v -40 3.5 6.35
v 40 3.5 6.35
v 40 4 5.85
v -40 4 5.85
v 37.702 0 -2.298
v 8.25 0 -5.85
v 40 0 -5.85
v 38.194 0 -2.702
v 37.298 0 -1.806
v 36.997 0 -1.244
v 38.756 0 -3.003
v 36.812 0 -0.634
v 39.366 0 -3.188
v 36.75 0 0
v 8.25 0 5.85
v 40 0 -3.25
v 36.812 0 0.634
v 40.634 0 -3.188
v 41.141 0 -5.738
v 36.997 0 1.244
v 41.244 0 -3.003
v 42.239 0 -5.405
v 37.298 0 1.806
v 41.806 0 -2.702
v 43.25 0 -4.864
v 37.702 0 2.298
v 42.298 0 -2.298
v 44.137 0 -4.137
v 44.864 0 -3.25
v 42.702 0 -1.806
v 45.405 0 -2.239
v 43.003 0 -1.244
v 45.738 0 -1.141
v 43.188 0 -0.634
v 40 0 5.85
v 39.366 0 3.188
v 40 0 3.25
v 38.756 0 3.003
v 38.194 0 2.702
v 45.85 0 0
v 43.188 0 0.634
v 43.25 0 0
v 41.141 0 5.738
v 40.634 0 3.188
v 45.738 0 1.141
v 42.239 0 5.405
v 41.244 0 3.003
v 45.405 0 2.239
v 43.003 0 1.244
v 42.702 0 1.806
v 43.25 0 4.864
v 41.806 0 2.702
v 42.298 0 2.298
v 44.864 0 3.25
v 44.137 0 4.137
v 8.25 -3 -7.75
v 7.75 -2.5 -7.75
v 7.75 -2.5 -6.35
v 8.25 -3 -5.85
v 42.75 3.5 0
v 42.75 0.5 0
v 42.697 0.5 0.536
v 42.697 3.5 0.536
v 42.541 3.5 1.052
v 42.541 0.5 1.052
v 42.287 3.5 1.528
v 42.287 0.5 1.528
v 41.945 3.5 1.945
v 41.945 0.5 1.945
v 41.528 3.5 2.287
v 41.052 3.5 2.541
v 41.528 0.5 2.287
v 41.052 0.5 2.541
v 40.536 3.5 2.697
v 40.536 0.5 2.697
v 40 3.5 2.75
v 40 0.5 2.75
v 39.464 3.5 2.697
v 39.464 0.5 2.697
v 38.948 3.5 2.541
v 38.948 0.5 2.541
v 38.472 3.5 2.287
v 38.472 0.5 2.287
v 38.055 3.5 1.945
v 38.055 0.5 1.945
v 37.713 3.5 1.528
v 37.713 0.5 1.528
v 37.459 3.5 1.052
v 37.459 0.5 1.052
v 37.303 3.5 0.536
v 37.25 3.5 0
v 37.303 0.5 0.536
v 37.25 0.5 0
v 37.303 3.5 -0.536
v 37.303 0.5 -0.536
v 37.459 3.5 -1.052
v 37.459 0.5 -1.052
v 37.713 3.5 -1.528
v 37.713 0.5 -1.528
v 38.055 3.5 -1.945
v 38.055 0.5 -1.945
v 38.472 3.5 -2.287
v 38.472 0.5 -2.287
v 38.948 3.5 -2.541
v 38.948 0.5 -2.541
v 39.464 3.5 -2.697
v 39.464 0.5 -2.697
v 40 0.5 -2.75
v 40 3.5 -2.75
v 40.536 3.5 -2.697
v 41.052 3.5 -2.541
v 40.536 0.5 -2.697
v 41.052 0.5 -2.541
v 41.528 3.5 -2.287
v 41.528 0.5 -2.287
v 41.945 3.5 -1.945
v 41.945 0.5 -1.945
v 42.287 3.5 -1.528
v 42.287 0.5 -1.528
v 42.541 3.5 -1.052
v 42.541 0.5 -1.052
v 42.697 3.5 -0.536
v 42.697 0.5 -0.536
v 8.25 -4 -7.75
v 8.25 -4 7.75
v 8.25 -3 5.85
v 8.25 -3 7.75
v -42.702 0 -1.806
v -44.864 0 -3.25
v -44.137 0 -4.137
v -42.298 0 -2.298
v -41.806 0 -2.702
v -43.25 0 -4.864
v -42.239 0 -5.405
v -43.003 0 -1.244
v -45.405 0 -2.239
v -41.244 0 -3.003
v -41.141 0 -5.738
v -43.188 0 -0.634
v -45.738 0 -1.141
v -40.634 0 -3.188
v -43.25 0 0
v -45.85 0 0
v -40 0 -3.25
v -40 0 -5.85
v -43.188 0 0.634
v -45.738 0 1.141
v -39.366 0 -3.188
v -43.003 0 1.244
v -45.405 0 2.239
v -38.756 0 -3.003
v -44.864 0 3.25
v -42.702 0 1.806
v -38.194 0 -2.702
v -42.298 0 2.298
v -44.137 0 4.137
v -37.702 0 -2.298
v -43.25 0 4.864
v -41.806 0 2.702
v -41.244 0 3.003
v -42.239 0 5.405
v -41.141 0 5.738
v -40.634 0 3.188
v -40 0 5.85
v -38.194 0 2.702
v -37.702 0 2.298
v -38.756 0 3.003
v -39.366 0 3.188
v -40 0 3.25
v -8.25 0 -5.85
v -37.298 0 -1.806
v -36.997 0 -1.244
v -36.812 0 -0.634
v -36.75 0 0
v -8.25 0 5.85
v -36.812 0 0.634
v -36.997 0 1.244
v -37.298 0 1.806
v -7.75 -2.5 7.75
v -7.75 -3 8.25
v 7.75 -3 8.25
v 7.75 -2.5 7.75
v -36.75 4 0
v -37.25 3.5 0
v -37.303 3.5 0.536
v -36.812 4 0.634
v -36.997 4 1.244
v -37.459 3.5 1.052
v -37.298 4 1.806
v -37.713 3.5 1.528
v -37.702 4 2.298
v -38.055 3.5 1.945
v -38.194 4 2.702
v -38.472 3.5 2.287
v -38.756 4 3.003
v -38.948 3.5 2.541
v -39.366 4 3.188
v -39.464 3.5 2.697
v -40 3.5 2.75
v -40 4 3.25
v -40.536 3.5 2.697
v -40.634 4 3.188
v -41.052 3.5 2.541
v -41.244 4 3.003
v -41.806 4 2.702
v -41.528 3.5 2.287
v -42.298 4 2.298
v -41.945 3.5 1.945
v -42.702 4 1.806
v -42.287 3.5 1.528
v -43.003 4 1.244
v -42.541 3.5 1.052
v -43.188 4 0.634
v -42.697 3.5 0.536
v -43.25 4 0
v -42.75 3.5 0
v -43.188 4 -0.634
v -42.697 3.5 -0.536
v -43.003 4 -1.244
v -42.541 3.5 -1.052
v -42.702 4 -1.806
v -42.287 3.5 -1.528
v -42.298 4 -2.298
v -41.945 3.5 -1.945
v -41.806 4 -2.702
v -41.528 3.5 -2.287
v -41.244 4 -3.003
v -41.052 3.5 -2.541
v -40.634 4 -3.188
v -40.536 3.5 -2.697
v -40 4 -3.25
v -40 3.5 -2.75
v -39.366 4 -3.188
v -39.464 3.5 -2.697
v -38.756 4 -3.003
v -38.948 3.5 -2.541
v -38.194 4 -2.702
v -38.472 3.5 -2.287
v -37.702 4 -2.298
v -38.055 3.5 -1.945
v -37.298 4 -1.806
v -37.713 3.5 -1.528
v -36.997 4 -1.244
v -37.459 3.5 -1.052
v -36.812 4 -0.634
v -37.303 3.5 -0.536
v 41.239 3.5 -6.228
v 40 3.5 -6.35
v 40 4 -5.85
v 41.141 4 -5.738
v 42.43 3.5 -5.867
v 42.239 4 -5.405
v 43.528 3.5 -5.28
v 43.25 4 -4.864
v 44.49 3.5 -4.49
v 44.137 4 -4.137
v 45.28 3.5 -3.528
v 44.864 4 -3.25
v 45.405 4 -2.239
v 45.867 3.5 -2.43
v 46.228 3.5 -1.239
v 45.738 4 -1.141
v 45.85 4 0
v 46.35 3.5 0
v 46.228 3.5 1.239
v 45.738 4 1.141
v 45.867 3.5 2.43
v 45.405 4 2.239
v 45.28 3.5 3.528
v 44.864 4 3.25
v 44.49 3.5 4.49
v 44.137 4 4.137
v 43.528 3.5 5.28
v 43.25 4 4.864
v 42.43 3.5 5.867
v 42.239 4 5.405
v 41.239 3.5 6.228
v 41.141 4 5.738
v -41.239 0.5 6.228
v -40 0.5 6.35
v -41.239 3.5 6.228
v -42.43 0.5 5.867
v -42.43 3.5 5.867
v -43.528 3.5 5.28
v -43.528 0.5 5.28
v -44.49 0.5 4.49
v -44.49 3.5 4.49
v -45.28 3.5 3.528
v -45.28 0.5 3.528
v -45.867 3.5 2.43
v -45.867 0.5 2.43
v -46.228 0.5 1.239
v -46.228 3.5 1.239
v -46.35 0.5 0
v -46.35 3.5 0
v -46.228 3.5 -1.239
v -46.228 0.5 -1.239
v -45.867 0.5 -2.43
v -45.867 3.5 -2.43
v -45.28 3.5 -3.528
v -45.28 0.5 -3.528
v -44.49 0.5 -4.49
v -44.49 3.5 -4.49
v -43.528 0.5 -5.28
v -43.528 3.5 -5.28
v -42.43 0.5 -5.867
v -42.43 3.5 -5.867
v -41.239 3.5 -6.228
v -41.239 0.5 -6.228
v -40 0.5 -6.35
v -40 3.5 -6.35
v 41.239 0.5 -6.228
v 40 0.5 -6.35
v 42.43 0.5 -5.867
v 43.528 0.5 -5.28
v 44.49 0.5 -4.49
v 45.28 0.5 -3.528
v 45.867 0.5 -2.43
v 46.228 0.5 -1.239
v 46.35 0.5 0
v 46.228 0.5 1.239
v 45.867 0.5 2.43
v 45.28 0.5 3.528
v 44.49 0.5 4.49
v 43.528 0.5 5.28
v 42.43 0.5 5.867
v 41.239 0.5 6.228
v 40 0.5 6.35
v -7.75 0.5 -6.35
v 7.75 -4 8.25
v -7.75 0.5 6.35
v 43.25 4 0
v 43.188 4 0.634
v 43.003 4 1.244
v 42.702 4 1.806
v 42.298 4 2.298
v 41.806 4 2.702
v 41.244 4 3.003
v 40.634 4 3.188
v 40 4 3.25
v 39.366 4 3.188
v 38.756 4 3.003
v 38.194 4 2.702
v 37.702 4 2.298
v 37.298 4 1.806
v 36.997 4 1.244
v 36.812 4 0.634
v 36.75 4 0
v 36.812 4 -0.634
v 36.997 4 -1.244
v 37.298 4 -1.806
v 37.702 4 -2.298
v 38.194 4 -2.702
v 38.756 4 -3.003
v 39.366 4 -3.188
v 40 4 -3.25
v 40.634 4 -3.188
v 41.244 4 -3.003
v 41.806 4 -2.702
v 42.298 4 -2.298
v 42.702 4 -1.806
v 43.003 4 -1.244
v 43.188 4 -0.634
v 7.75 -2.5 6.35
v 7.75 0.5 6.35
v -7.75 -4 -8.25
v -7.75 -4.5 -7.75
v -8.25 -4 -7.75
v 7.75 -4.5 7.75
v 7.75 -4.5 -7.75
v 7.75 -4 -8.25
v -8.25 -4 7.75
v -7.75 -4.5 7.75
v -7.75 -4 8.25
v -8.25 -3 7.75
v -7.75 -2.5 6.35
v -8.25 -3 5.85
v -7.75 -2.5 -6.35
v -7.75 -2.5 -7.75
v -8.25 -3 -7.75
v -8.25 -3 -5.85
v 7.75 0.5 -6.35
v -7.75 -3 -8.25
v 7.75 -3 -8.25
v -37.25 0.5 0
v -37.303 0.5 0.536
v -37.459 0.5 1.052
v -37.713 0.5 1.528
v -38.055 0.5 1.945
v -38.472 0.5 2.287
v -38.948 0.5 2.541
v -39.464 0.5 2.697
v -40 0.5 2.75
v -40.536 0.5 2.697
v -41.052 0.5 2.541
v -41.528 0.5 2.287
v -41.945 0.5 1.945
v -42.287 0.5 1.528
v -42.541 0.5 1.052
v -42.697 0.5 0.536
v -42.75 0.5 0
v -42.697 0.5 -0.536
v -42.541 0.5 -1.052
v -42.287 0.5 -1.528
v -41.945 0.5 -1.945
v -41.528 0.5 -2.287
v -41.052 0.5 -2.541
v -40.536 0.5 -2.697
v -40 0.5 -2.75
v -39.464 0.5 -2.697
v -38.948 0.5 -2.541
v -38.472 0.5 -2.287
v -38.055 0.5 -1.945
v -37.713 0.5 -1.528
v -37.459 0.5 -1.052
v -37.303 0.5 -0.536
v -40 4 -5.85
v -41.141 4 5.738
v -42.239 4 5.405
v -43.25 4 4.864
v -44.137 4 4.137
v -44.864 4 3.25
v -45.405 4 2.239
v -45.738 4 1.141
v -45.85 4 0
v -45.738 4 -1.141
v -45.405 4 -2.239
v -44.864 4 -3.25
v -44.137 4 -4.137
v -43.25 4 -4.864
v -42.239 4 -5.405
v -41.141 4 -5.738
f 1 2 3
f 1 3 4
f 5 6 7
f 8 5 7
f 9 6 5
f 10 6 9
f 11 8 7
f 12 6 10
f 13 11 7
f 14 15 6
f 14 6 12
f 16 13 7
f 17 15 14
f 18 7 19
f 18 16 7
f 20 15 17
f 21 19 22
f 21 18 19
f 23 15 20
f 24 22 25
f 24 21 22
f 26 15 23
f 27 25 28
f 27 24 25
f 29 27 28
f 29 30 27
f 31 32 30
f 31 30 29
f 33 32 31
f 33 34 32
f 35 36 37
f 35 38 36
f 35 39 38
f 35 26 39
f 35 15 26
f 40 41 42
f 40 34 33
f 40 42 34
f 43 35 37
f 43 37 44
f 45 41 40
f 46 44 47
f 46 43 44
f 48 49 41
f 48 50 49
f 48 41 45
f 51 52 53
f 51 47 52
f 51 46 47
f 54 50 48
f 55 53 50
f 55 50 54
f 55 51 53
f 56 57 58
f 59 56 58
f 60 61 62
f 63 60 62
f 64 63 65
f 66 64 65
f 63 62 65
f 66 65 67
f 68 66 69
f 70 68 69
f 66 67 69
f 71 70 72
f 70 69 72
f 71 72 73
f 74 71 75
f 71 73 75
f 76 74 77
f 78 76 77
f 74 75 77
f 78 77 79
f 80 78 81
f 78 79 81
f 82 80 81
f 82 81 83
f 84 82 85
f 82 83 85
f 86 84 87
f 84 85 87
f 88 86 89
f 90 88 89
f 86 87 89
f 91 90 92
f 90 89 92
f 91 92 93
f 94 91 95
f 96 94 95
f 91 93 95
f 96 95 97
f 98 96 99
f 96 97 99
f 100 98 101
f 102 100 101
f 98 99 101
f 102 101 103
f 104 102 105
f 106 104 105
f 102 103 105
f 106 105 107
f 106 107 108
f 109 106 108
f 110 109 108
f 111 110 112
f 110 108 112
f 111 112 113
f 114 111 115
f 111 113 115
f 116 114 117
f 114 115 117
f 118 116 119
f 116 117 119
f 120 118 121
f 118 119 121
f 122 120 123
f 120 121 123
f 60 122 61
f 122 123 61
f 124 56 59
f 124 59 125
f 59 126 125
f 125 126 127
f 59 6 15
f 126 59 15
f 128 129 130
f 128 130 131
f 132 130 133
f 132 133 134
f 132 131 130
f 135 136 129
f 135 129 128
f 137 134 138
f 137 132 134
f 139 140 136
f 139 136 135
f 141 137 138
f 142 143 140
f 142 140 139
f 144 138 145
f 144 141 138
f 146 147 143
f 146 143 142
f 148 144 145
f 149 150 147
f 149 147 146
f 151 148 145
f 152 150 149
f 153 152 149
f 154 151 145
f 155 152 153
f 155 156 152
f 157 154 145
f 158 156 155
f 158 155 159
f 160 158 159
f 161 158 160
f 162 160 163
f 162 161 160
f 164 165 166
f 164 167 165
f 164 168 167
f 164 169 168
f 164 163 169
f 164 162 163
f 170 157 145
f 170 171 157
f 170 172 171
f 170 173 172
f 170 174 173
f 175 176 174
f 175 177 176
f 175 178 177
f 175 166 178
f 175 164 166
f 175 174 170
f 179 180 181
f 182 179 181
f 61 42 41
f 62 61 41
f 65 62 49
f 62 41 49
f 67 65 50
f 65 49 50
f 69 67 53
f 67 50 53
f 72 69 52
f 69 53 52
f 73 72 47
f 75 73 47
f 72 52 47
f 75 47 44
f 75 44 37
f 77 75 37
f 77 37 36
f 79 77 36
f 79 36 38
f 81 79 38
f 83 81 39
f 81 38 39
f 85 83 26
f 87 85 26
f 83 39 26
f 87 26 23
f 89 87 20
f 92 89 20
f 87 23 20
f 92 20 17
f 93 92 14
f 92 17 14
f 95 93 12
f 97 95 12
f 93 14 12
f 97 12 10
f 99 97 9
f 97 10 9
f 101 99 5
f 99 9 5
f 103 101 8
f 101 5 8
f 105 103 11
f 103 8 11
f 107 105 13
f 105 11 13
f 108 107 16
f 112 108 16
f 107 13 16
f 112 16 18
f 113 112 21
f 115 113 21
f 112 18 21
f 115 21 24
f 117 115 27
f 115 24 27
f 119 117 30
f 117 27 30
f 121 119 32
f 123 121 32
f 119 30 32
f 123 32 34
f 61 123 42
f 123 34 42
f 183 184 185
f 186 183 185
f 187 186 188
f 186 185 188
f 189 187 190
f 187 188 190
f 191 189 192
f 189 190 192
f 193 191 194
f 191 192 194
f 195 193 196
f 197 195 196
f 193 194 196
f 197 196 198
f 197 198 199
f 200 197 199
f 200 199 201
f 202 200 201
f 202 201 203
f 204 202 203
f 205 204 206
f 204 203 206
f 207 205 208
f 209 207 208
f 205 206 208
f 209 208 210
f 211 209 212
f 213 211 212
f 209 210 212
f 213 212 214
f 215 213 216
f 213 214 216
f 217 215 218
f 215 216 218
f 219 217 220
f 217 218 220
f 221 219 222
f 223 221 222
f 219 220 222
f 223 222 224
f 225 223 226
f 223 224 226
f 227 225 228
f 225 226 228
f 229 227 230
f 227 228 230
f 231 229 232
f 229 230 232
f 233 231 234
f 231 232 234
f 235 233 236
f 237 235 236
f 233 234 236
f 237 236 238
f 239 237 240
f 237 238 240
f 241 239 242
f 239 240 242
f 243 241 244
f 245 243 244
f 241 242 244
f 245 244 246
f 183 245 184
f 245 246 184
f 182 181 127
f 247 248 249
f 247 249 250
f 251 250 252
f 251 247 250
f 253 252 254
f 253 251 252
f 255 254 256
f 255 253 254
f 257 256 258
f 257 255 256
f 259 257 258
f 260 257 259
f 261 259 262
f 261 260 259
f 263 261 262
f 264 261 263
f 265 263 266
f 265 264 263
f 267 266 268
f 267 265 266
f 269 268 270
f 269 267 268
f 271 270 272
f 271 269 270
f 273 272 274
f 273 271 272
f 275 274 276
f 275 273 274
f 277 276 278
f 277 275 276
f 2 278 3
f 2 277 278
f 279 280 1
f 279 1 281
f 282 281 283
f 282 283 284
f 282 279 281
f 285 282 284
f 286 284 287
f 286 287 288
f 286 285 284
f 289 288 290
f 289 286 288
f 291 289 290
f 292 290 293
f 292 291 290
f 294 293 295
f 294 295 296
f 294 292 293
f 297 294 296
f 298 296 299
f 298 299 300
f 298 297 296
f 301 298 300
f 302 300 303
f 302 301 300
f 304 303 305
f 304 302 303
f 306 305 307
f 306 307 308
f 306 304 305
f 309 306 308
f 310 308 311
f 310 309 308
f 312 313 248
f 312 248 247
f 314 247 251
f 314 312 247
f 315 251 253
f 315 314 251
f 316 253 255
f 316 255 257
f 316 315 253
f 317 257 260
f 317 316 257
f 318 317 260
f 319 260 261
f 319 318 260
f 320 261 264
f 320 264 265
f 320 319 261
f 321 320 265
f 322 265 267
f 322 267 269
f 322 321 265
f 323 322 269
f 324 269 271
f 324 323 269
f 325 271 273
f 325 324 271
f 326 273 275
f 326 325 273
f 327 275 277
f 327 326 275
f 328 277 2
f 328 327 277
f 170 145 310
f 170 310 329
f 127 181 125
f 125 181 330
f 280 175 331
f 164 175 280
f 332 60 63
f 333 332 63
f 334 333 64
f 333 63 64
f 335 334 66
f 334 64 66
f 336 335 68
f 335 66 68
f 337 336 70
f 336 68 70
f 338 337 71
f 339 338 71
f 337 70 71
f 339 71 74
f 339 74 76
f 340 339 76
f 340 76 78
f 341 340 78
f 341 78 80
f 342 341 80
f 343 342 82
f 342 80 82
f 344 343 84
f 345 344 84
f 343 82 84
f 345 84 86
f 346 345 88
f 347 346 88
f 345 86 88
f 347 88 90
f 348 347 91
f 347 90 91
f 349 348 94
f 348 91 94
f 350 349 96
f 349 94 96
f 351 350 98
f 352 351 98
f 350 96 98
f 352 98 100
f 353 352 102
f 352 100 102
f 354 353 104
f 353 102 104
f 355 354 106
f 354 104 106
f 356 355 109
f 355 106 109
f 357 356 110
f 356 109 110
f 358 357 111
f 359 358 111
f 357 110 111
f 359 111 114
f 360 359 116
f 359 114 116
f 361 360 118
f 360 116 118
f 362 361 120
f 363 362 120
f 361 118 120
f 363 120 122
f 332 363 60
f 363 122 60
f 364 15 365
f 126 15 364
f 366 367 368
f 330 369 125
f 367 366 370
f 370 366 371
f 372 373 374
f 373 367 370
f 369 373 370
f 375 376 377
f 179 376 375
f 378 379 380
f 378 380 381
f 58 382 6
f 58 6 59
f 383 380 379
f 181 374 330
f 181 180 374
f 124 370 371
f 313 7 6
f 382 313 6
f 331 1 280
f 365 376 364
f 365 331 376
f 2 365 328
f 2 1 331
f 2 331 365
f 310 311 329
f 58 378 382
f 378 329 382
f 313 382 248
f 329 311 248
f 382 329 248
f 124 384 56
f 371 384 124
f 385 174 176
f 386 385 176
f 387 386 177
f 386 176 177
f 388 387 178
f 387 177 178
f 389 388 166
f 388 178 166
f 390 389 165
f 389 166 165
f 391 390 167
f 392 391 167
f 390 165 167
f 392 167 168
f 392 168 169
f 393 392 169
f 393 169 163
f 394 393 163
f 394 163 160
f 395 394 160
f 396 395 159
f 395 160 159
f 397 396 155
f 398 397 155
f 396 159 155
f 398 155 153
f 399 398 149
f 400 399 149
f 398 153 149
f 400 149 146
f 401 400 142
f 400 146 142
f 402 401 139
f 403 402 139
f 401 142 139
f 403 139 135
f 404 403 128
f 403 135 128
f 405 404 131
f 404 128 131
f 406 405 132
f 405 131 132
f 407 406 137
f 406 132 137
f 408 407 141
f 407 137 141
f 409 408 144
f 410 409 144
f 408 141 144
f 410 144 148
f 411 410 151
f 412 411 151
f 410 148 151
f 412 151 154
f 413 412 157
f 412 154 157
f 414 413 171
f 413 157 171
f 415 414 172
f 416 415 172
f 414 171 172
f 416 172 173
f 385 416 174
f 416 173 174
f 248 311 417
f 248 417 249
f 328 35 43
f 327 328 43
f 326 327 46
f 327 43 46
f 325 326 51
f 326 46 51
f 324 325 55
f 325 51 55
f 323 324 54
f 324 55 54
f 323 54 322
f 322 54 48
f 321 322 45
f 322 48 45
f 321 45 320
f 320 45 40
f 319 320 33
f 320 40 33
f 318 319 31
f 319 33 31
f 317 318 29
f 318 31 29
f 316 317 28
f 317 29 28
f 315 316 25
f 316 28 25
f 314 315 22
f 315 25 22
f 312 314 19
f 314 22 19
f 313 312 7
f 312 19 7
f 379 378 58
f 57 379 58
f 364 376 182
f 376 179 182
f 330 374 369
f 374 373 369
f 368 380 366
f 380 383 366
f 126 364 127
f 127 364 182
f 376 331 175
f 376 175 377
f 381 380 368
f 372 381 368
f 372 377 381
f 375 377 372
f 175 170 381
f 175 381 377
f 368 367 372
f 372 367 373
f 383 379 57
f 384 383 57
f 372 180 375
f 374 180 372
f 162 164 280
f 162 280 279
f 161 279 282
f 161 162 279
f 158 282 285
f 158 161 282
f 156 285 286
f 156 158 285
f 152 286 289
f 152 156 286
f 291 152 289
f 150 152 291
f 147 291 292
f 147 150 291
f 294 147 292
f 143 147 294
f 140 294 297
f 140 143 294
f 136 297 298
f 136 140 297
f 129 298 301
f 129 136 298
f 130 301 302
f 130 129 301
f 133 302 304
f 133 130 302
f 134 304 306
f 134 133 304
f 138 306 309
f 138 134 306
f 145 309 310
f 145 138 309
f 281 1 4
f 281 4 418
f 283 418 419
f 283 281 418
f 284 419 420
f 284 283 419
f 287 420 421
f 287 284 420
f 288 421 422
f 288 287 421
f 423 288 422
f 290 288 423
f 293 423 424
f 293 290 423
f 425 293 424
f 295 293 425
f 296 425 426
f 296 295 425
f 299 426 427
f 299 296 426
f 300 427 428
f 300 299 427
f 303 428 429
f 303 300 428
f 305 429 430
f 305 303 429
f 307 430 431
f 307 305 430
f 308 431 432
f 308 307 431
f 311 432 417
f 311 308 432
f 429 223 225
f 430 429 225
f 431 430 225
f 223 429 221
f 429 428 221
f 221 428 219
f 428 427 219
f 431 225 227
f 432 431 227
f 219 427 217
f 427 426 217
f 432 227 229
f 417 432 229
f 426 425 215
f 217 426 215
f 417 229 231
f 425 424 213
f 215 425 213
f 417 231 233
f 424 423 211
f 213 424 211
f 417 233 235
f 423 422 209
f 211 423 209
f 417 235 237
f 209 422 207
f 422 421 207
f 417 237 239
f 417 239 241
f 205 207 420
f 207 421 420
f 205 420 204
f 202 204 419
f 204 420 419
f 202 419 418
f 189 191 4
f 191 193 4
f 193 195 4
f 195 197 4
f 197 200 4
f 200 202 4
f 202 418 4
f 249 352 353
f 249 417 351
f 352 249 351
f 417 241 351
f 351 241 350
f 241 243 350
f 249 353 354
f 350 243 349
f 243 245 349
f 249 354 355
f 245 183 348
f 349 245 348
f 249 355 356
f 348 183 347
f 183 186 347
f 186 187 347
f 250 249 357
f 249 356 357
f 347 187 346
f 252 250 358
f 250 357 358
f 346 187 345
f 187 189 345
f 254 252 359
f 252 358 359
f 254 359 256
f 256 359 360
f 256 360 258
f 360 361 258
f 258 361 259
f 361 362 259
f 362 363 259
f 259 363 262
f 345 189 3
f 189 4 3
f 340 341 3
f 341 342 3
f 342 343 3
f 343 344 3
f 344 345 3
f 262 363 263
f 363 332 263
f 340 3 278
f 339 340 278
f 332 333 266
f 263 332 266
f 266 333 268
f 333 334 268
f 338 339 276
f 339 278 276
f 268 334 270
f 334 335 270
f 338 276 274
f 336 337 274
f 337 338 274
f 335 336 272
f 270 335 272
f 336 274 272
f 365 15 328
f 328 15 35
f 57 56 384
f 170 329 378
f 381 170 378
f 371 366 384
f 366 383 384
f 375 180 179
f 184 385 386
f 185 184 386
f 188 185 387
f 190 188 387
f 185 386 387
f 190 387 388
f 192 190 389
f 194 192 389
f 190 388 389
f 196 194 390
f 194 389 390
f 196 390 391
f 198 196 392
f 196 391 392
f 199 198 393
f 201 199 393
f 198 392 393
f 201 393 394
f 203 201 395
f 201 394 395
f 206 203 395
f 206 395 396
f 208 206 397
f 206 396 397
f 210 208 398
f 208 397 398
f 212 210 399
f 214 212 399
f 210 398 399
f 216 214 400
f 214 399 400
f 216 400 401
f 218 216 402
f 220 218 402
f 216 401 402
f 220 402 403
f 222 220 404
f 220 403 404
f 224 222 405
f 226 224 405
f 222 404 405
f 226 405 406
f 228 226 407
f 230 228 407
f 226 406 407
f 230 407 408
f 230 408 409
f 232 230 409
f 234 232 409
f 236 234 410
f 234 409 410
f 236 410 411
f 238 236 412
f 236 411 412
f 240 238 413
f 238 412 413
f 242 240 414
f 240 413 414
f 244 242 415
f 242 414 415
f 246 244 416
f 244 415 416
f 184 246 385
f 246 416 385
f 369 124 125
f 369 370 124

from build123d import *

# Parameters (mm, degrees)
F0_R     = 2.75
F1_DEPTH = 4
F2_W     = 16.5
F2_H     = 16.5
F3_DEPTH = 4.5
F4_W     = 26.5
F4_H     = 22.7
F4_W_2   = 16.5
F4_H_2   = 12.7
F5_DEPTH = 2.5
F7_SIZE  = 0.5


with BuildPart() as f1:
    # F0 (on Front) → F1 (new body)
    with BuildSketch(Plane.XZ):
        with BuildLine():
            ThreePointArc((40, -6.35), (46.35, 0), (40, 6.35))
            Line((40, 6.35), (-40, 6.35))
            ThreePointArc((-40, 6.35), (-46.35, 0), (-40, -6.35))
            Line((-40, -6.35), (40, -6.35))
        make_face()
        with Locations((-40, 0)):
            Circle(F0_R, mode=Mode.SUBTRACT)
        with Locations((40, 0)):
            Circle(F0_R, mode=Mode.SUBTRACT)
    extrude(amount=-F1_DEPTH)

    # F2 (on Front) → F3 (join)
    with BuildSketch(Plane.XZ):
        Rectangle(F2_W, F2_H)
    extrude(amount=F3_DEPTH)

    # F4 (on face) → F5 (cut)
    with BuildSketch(Plane.XZ):
        Rectangle(F4_W, F4_H)
        Rectangle(F4_W_2, F4_H_2, mode=Mode.SUBTRACT)
    extrude(amount=F5_DEPTH, mode=Mode.SUBTRACT)

    # F7
    f7_edges = [f1.edges().sort_by_distance(p)[0] for p in [
        (8.25, -4.5, 0),
        (0, -4.5, 8.25),
        (-8.25, -4.5, 0),
        (0, -4.5, -8.25),
        (8.25, -3.5, 8.25),
        (-8.25, -3.5, 8.25),
        (-8.25, -3.5, -8.25),
        (8.25, -3.5, -8.25),
        (46.35, 4, 0),
        (0, 4, 6.35),
        (-46.35, 4, 0),
        (0, 4, -6.35),
        (-42.75, 4, 0),
        (37.25, 4, 0),
        (0, -2.5, 8.25),
        (8.25, -2.5, -7.3),
        (8.25, -2.5, 7.3),
        (-8.25, -2.5, 7.3),
        (-8.25, -2.5, -7.3),
        (0, -2.5, -8.25),
        (24.125, 0, 6.35),
        (37.25, 0, 0),
        (8.25, -1.25, 6.35),
        (8.25, -1.25, -6.35),
        (-8.25, -1.25, 6.35),
        (-8.25, -1.25, -6.35),
        (-24.125, 0, -6.35),
        (-42.75, 0, 0),
        (46.35, 0, 0),
        (-46.35, 0, 0),
        (-24.125, 0, 6.35),
        (24.125, 0, -6.35),
    ]]
    chamfer(f7_edges, length=F7_SIZE)


solid = f1.part
